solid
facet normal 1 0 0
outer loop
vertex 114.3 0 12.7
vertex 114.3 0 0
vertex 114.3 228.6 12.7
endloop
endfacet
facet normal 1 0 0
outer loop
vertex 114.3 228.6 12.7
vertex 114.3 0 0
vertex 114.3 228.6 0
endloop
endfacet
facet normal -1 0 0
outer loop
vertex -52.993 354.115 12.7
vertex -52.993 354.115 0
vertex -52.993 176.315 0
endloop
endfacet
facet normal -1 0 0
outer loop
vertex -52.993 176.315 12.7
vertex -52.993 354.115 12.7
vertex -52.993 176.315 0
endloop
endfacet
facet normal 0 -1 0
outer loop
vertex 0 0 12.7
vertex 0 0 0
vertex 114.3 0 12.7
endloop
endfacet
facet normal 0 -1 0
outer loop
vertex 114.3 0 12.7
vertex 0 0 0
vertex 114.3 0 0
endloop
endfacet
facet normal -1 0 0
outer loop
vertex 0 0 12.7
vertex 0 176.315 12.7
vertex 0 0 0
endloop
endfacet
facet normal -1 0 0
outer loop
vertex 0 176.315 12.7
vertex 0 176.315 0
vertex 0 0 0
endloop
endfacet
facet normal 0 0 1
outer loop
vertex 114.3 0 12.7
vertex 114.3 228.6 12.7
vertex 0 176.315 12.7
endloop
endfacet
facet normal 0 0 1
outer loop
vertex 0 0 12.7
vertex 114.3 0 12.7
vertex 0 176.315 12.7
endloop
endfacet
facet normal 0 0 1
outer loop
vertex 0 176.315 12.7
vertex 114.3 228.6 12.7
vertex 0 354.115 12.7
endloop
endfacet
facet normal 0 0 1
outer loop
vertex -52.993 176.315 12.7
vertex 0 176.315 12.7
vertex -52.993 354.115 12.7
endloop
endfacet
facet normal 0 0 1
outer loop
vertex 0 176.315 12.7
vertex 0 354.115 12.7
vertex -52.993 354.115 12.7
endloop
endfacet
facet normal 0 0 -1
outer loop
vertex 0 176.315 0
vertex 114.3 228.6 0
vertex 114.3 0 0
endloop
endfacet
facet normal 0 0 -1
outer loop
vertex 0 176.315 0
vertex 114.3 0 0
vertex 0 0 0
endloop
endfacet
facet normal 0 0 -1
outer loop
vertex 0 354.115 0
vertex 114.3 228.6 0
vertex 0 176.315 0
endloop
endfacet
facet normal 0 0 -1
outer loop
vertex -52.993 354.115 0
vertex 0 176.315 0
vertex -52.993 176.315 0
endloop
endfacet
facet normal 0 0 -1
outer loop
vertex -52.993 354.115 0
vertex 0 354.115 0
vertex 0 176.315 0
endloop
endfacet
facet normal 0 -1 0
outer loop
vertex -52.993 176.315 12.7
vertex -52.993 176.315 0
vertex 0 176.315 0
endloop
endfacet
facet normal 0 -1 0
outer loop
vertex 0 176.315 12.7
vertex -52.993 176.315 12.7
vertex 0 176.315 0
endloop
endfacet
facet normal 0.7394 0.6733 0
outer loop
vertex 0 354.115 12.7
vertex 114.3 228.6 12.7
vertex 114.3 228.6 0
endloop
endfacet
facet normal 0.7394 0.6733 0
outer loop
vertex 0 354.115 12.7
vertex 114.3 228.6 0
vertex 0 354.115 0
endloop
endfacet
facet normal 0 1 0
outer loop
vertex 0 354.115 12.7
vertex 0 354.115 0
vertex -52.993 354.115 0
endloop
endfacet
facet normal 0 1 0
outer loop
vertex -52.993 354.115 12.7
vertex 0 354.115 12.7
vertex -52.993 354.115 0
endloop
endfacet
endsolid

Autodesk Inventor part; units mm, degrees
ref_plane "YZ Plane" through (0, 0, 0) normal (1, 0, 0) x (0, 1, 0)
ref_plane "XZ Plane" through (0, 0, 0) normal (0, 1, 0) x (-1, 0, 0)
ref_plane "XY Plane" through (0, 0, 0) normal (0, 0, 1) x (1, 0, 0)
sketch "Sketch1" plane through (0, 0, 0) normal (0, 0, 1) x (1, 0, 0)
  line L0 (0, 0) -> (114.3, 0)
  line L1 (114.3, 0) -> (114.3, 228.6)
  line L2 (114.3, 228.6) -> (0, 228.6)
  line L3 (0, 228.6) -> (0, 0)
  dimension "d0" = 114.3
  dimension "d1" = 228.6
extrude "Extrusion1" add sketch "Sketch1" along normal blind 12.7
sketch "Sketch3" plane through (0, 0, 12.7) normal (0, 0, 1) x (1, 0, 0)
  line L0 (114.3, 0) -> (114.3, 228.6) projected
  line L1 (114.3, 228.6) -> (0, 354.1146)
  line L2 (0, 354.1146) -> (0, 228.6)
  line L3 (0, 228.6) -> (114.3, 228.6)
  point P0 (0, 0)
extrude "Extrusion2" add sketch "Sketch3" against normal blind 12.7
sketch "Sketch4" plane through (0, 0, 0) normal (0, 0, -1) x (-1, 0, 0)
  line L0 (0, 354.1146) -> (52.993, 354.1146)
  line L1 (52.993, 354.1146) -> (52.993, 176.3146)
  line L2 (52.993, 176.3146) -> (0, 176.3146)
  line L3 (0, 176.3146) -> (0, 354.1146)
  point P0 (0, 0)
  point P1 (0, 354.1146)
  dimension "d7" = 177.8
extrude "Extrusion3" add sketch "Sketch4" against normal blind 12.7
properties part number "motor mount platform"
